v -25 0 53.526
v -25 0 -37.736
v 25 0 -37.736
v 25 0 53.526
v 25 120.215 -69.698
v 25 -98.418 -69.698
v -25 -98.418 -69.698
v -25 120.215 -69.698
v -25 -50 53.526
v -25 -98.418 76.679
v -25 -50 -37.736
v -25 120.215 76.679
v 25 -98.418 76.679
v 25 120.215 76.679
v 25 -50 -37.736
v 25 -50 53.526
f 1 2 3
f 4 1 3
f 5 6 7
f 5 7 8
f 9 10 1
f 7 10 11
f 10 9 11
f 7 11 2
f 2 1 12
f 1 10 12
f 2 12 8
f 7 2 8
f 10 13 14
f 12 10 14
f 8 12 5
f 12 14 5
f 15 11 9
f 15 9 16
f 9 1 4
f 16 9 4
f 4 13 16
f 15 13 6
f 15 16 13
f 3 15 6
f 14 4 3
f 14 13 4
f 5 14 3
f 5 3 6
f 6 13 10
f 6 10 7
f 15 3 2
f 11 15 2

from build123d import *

# Parameters (mm, degrees)
SKETCH2_W           = 146.376941915
SKETCH2_H           = 218.632716635
BOSS_EXTRUDE2_DEPTH = 25
CUT_EXTRUDE1_DEPTH  = 50


with BuildPart() as part:
    # Sketch2 → Boss-Extrude2 (new, symmetric)
    with BuildSketch(Plane(origin=(0, 0, 0), x_dir=(0, 0, -1), z_dir=(1, 0, 0))):
        with Locations((-3.490539111, 10.898614686)):
            Rectangle(SKETCH2_W, SKETCH2_H)
    extrude(amount=BOSS_EXTRUDE2_DEPTH, both=True)

    # Sketch1 → Cut-Extrude1 (cut)
    with BuildSketch(Plane(origin=(0, 0, 0), x_dir=(1, 0, 0), z_dir=(0, 1, 0))):
        with BuildLine():
            Line((28.234849526, 37.73567567), (-25.290931566, 37.73567567))
            add(Edge.make_bspline(
                [(-25.290931566, 37.73567567), (-30.76189097, 7.536622835), (-30.130821337, -23.0684525), (-31.981654202, -53.525781092)],
                knots=[0, 0, 0, 0, 1, 1, 1, 1], degree=3))
            Line((-31.981654202, -53.525781092), (35.996087784, -53.525781092))
            add(Edge.make_bspline(
                [(28.234849526, 37.73567567), (39.487990314, 7.96851172), (30.114114901, -23.184955899), (35.996087784, -53.525781092)],
                knots=[0, 0, 0, 0, 1, 1, 1, 1], degree=3))
        make_face()
    extrude(amount=-CUT_EXTRUDE1_DEPTH, mode=Mode.SUBTRACT)


solid = part.part
